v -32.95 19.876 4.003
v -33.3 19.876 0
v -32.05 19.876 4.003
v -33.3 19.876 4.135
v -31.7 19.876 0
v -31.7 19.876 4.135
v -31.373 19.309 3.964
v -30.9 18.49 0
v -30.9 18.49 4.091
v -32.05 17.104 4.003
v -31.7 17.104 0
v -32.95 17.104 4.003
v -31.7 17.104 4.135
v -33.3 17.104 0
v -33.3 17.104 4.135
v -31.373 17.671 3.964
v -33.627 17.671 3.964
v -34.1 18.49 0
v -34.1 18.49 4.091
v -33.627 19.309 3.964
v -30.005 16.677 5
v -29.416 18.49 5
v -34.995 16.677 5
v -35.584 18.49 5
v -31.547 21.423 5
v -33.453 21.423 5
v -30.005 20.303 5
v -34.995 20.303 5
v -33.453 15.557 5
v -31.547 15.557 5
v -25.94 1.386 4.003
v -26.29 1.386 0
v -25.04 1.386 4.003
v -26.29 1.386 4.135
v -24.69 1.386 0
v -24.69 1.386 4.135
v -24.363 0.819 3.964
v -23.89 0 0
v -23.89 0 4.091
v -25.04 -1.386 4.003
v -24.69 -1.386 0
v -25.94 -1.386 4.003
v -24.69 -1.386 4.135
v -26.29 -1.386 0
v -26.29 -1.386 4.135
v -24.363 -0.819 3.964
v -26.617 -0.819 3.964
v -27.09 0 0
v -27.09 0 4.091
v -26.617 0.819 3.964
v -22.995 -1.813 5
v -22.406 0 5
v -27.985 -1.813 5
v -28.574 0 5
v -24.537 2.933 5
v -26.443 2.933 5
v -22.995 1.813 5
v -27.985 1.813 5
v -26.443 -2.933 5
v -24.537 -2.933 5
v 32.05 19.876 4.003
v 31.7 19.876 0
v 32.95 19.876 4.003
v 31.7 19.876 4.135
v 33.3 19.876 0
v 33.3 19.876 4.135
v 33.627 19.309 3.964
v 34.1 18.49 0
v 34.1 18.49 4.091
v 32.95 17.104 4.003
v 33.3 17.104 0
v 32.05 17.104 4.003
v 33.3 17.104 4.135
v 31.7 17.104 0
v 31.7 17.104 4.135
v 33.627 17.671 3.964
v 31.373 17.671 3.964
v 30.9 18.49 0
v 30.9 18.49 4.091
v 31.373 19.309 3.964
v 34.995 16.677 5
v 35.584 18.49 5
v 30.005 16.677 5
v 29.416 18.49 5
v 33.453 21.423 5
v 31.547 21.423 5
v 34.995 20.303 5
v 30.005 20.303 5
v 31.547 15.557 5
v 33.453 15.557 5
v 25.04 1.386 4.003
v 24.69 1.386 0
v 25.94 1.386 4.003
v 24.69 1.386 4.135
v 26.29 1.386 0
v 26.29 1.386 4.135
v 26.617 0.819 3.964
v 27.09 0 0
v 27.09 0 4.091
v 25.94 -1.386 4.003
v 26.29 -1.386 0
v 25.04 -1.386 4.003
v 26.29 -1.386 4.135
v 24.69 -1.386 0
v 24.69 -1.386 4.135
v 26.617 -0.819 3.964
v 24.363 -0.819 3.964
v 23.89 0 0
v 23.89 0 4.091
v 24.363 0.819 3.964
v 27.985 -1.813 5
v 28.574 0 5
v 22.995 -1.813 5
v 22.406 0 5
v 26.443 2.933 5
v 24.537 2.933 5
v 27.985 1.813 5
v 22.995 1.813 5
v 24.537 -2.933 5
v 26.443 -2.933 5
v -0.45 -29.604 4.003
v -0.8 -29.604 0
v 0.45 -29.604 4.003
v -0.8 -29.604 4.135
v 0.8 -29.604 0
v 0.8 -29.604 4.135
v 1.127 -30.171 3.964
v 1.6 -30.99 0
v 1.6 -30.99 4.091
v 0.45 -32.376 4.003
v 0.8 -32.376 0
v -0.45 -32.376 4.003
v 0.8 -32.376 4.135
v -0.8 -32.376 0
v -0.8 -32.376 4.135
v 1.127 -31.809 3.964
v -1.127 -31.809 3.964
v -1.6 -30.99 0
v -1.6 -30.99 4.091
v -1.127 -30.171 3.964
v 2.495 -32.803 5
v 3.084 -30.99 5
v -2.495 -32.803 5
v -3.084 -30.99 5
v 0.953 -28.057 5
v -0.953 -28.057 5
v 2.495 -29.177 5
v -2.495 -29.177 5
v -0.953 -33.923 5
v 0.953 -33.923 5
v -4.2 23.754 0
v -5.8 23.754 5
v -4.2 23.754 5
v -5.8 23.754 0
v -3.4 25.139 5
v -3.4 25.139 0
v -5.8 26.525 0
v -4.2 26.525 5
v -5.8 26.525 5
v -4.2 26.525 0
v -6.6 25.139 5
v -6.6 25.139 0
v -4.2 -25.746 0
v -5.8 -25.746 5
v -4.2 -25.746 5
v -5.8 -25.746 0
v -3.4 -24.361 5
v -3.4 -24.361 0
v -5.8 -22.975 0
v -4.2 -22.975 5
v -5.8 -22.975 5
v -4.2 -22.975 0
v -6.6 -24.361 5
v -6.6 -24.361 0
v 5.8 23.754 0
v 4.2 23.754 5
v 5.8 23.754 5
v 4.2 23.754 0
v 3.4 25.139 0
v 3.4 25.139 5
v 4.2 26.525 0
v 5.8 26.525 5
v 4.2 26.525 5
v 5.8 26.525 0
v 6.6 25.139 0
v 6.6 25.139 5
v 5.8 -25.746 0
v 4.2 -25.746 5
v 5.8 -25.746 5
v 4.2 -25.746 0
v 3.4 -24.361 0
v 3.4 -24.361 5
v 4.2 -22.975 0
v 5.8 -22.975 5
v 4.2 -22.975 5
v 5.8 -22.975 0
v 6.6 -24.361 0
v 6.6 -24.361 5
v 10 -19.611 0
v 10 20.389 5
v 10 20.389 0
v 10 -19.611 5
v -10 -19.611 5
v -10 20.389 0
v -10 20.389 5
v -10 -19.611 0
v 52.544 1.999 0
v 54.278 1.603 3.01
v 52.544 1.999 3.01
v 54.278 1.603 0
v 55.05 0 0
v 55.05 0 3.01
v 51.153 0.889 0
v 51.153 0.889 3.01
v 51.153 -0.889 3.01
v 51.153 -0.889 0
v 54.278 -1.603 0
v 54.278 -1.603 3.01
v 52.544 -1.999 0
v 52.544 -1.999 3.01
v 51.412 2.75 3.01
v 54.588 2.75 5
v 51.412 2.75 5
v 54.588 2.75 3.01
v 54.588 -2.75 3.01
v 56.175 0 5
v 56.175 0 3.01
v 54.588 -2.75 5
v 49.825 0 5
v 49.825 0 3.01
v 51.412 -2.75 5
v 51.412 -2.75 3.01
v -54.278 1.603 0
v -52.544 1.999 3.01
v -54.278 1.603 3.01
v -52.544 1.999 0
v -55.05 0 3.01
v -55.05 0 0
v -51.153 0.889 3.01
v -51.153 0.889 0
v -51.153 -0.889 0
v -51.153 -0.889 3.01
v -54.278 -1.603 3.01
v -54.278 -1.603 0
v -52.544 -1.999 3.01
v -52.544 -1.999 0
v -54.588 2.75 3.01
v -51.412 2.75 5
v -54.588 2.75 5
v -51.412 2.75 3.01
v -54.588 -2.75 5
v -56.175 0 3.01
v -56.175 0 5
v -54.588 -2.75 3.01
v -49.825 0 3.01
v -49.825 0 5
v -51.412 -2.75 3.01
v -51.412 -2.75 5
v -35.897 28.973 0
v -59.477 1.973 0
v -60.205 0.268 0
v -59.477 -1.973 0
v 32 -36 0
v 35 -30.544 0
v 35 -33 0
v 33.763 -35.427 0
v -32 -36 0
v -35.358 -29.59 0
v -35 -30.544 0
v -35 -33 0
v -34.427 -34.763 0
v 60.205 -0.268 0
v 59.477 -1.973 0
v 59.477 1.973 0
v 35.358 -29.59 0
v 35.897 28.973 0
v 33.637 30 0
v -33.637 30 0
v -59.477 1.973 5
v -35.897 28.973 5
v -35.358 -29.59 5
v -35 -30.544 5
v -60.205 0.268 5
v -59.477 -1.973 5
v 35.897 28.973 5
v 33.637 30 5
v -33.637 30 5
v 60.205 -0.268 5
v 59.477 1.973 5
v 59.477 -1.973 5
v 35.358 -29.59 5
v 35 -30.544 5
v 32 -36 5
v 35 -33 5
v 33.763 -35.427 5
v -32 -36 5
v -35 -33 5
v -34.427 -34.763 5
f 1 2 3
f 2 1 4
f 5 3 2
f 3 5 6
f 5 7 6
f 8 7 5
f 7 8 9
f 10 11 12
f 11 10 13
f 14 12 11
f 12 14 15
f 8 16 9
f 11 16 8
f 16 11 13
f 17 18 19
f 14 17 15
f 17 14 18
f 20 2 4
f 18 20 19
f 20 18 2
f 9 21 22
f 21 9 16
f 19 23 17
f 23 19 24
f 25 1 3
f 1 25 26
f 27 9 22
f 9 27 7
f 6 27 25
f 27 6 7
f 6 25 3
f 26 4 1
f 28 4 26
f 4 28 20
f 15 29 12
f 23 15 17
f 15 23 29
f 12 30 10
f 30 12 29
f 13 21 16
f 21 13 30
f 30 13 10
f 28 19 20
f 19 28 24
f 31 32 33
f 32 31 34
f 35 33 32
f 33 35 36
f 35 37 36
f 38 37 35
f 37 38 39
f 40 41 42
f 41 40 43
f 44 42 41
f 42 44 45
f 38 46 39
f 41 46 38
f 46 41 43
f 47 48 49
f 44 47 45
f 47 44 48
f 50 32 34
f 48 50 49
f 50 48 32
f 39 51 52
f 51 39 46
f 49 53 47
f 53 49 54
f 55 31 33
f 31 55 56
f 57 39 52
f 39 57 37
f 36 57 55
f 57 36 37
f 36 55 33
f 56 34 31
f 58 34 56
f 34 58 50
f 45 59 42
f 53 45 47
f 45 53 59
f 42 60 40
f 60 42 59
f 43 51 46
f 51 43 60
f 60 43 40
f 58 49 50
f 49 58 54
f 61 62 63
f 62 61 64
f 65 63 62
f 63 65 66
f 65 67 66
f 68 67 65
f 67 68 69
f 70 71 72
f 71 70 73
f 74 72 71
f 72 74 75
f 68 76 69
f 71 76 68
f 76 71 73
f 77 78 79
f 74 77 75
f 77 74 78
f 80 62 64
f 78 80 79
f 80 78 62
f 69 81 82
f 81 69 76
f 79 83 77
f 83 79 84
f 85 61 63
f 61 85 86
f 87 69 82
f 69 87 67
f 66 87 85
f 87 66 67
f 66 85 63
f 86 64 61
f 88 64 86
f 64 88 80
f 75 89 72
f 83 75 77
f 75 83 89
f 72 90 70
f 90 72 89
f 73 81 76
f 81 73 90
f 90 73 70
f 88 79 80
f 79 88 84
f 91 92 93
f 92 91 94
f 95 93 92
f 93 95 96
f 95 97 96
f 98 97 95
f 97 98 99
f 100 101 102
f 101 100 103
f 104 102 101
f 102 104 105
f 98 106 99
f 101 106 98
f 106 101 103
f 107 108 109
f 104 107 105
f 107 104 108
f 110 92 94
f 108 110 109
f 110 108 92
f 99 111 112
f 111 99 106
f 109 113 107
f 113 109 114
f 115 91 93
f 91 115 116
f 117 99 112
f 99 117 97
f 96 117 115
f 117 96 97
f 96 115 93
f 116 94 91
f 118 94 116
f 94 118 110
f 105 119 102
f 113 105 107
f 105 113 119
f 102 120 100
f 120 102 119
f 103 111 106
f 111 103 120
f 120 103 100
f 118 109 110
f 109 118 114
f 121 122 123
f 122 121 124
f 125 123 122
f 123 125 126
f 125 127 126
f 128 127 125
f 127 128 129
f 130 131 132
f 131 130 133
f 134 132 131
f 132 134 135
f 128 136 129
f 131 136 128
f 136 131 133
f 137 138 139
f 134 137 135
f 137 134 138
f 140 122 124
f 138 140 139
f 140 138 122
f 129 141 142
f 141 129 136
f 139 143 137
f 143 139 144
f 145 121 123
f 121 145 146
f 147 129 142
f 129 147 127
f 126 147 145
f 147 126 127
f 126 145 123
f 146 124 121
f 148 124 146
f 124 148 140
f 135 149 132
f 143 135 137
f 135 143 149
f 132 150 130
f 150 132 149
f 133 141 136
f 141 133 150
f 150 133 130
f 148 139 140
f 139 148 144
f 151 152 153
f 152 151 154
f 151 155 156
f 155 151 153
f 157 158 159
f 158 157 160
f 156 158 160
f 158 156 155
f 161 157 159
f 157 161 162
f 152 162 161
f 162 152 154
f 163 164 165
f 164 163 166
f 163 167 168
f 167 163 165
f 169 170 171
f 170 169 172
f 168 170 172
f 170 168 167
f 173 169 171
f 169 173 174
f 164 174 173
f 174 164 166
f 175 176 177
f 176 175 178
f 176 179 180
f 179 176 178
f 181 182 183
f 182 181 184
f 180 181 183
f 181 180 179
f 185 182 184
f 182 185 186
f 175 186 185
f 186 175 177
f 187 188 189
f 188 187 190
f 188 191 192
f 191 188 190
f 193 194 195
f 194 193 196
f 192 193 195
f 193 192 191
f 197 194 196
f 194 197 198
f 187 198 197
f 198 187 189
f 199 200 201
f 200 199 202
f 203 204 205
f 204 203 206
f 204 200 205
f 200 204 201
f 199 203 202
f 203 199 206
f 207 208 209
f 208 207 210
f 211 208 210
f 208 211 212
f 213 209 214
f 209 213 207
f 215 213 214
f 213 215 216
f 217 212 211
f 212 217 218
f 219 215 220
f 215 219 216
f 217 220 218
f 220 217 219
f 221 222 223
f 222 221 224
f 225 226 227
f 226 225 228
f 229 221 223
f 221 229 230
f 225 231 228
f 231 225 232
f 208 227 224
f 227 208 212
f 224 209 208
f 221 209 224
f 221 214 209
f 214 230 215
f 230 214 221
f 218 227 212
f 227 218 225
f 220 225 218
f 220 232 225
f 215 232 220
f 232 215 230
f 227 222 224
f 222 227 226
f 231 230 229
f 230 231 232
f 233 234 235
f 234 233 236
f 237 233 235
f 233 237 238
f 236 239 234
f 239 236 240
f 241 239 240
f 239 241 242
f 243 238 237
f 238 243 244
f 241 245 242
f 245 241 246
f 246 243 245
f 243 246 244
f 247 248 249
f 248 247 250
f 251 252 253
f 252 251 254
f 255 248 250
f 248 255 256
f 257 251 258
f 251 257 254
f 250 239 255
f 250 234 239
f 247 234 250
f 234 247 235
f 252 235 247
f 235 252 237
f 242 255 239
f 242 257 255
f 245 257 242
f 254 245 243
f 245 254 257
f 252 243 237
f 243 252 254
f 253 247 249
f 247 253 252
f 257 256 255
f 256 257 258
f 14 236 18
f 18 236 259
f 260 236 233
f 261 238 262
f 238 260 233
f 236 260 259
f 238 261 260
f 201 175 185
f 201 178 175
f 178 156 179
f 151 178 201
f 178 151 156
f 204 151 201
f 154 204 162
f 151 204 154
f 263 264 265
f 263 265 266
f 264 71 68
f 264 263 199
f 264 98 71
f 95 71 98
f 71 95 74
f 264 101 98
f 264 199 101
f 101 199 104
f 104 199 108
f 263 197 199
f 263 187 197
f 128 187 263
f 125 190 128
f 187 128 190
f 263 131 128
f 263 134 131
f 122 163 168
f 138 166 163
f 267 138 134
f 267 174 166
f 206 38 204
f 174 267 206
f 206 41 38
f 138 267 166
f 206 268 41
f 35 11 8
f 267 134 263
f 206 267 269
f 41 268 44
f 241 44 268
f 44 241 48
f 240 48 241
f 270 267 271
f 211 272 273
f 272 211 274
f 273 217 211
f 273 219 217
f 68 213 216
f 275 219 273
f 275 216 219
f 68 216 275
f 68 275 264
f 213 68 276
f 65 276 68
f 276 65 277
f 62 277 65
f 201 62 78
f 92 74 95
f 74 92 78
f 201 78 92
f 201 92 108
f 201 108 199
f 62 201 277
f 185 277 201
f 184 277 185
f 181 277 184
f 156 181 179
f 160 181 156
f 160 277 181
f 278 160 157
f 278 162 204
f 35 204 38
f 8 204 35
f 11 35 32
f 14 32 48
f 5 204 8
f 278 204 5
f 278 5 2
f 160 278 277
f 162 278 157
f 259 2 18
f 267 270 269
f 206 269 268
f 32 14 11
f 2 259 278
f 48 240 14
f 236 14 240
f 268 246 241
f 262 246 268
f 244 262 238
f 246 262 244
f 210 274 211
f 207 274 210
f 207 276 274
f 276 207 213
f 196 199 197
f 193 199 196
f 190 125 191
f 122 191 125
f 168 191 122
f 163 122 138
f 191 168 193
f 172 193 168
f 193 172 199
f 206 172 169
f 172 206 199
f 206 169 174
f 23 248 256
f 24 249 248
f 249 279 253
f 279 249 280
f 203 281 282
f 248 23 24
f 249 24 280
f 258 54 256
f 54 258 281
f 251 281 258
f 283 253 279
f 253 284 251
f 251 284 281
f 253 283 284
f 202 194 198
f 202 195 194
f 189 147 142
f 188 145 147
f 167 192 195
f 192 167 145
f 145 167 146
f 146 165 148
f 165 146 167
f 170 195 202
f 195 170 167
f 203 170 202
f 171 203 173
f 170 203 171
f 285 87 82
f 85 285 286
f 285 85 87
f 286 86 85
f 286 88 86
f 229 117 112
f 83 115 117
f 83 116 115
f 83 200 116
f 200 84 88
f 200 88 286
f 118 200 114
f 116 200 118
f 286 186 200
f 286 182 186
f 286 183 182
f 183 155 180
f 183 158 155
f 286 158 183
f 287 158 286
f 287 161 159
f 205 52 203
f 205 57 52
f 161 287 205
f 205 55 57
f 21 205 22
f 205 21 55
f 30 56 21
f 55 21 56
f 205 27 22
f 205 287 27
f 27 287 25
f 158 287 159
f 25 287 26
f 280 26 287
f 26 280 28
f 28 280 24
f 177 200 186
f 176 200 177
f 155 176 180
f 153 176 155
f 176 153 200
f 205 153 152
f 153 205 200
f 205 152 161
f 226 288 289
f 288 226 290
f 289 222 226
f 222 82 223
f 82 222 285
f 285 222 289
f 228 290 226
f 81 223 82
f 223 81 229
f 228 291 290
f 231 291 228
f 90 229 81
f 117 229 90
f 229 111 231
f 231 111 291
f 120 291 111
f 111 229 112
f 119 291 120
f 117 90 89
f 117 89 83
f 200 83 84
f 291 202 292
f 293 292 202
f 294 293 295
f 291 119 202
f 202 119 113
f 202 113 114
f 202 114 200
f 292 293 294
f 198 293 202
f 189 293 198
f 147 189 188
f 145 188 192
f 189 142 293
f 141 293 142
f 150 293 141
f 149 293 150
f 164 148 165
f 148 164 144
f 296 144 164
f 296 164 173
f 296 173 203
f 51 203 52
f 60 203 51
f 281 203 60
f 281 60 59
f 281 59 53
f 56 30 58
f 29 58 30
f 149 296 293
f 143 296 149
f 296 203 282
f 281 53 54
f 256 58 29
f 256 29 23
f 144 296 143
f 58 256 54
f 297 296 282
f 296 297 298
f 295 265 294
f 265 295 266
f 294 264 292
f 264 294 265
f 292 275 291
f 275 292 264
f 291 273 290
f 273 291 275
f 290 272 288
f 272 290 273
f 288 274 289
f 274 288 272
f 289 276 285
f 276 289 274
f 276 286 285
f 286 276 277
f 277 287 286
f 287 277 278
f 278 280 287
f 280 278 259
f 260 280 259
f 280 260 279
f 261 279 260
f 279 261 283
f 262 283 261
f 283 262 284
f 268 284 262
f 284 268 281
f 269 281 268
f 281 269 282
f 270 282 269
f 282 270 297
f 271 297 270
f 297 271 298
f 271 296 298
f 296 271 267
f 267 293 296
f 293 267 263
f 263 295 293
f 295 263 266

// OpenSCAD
// file: params.scad
e = 0.01;  // epsilon
m3_d = 3.2;  // hole diameter for an M3 screw
corner_r = 3; // corner radius

plate_thickness = 5;
// positions of the wheel/motor mountings (not the wheels themselves)
back_wheel_pos = [53, 0];
front_wheel_pos = [53, 180];

// Widths on the plate are measured from the main axis => they are halved!

// the back plate on which the motors and back wheels are mounted;
// needs to be long enough for the wheels to fit
back_plate_length = 36*2;
// the plate on which the battery is mounted
middle_plate_width = 75;
// width of the cutout behind and in front of the front wheels for them to
// steer freely
steering_cutout_width = 35;

motor_d = 25;
motor_len = 47.8;
motor_holder_len = 15;
motor_bracket_screw_hole_margin = 2.75;

accessory_hole_spacing = 20;

servo_plate_support_height = 20;
// hole positions for attaching the servo plate to the bottom plate;
// when edited, you should probably adjust the hard-coded parameters of the supports in bottom_plate.scad
servo_plate_holes = [
    // T-shaped support, left side
    [-13.5 - 25 + 6, 15.5 + 3 - e],
    [-13.5 - (25-7)/2 - 3 + e, 0],
    // T-shaped support, right side
    [13.5 + 25 - 6, 15.5 + 3 - e],
    [13.5 + (25-7)/2 + 3 - e, 0],
    // horizontal support
    [0, -28-3+e]
];
// file: utils.scad
include <params.scad>
include <MCAD/regular_shapes.scad>

module mirror_copy(v = [1,0,0]) {
    children();
    mirror(v) {
        children();
    }
}

module rounded_rect(size, r, center=false) {
    module _shape() {
        hull() {
            translate([r, r]) circle(r);
            translate([size.x - r, r]) circle(r);
            translate([r, size.y - r]) circle(r);
            translate([size.x - r, size.y - r]) circle(r);
        }
    }
    if (!center)
        _shape();
    else 
        translate([-size.x/2, -size.y/2]) _shape();
}

module conic_hole_m3(height) {
    // dimensions according to DIN 7991 + 0.2 mm for tolerance
    cone_d = 6 + 0.2;
    cone_h = 1.7 + 0.2;

    union() {
        // hole
        cylinder(height, d = m3_d);
        // cone
        cylinder(cone_h, d1 = cone_d, d2 = 0);
    }
}

module m3_square_nut_hole() {
    hole_length = 19 - plate_thickness;  // enough for an M3x16 DIN7991 screw
    translate([0,0, -hole_length+e]) cylinder(d=m3_d, h=hole_length+e);
    translate([0,0, -6]) cube([6, 6, 2], center=true);
}

module m3_nut_hexagon() {
    hexagon(radius=5.5/2/cos(30));
}
// main file
use <utils.scad>
include <params.scad>

/*
 * The origin is on the front wheel axis.
 */

module base_shape_2d() {
    offset(r = corner_r) offset(r = -corner_r) // rounded corners
        mirror_copy()
            polygon([
                [0-e, -36],
                [steering_cutout_width, -36],
                [steering_cutout_width, -30],

                [front_wheel_pos.x+m3_d+5, 0],

                [steering_cutout_width, 30],
                [0-e, 30],
            ]);
}

module screw_holes() {
    module _hole(pos) {
        translate([pos.x, pos.y, plate_thickness+e])
            rotate([180, 0, 0])
                conic_hole_m3(plate_thickness + 2*e);
    }

    // TODO: not hardcoded values
    for (pos = servo_plate_holes) {
        _hole(pos);
    }
}

module servo_mount() {
    // origin is the rotor's axis
    // dimensions accoding to https://futaba.uk/products/fut05102732-3

    // servo hole
    translate([-10, -29.9, 0]) // translate the rotor axis to [0,0]
        cube([20, 40, plate_thickness + 2*e]);

    // screw holes
    module _screw_hole() {
        cylinder(d=m3_d, h=plate_thickness + 2*e);
    }

    mirror_copy() {
        translate([-5, 14.85]) _screw_hole();
        translate([-5, -34.65]) _screw_hole();
    }
}

module kingpin_holes() {
    screw_d = 4 + 0.1;  // 4 mm + tolerance
    pocket_height = 2;

    module _kingpin_hole() {
        translate([0,0,-e]) cylinder(d=screw_d, h=plate_thickness + 2*e);
        translate([0,0, plate_thickness - pocket_height + e])
            linear_extrude(height = pocket_height)
                m3_nut_hexagon();
    }

    mirror_copy()
        translate([front_wheel_pos.x, 0]) _kingpin_hole();
}

difference() {
    linear_extrude(height = plate_thickness) base_shape_2d();

    screw_holes();
    // y=10.2894 is a value calculated in FreeCAD
    translate([0, 10.2894, 0-e]) servo_mount();
    kingpin_holes();
}
